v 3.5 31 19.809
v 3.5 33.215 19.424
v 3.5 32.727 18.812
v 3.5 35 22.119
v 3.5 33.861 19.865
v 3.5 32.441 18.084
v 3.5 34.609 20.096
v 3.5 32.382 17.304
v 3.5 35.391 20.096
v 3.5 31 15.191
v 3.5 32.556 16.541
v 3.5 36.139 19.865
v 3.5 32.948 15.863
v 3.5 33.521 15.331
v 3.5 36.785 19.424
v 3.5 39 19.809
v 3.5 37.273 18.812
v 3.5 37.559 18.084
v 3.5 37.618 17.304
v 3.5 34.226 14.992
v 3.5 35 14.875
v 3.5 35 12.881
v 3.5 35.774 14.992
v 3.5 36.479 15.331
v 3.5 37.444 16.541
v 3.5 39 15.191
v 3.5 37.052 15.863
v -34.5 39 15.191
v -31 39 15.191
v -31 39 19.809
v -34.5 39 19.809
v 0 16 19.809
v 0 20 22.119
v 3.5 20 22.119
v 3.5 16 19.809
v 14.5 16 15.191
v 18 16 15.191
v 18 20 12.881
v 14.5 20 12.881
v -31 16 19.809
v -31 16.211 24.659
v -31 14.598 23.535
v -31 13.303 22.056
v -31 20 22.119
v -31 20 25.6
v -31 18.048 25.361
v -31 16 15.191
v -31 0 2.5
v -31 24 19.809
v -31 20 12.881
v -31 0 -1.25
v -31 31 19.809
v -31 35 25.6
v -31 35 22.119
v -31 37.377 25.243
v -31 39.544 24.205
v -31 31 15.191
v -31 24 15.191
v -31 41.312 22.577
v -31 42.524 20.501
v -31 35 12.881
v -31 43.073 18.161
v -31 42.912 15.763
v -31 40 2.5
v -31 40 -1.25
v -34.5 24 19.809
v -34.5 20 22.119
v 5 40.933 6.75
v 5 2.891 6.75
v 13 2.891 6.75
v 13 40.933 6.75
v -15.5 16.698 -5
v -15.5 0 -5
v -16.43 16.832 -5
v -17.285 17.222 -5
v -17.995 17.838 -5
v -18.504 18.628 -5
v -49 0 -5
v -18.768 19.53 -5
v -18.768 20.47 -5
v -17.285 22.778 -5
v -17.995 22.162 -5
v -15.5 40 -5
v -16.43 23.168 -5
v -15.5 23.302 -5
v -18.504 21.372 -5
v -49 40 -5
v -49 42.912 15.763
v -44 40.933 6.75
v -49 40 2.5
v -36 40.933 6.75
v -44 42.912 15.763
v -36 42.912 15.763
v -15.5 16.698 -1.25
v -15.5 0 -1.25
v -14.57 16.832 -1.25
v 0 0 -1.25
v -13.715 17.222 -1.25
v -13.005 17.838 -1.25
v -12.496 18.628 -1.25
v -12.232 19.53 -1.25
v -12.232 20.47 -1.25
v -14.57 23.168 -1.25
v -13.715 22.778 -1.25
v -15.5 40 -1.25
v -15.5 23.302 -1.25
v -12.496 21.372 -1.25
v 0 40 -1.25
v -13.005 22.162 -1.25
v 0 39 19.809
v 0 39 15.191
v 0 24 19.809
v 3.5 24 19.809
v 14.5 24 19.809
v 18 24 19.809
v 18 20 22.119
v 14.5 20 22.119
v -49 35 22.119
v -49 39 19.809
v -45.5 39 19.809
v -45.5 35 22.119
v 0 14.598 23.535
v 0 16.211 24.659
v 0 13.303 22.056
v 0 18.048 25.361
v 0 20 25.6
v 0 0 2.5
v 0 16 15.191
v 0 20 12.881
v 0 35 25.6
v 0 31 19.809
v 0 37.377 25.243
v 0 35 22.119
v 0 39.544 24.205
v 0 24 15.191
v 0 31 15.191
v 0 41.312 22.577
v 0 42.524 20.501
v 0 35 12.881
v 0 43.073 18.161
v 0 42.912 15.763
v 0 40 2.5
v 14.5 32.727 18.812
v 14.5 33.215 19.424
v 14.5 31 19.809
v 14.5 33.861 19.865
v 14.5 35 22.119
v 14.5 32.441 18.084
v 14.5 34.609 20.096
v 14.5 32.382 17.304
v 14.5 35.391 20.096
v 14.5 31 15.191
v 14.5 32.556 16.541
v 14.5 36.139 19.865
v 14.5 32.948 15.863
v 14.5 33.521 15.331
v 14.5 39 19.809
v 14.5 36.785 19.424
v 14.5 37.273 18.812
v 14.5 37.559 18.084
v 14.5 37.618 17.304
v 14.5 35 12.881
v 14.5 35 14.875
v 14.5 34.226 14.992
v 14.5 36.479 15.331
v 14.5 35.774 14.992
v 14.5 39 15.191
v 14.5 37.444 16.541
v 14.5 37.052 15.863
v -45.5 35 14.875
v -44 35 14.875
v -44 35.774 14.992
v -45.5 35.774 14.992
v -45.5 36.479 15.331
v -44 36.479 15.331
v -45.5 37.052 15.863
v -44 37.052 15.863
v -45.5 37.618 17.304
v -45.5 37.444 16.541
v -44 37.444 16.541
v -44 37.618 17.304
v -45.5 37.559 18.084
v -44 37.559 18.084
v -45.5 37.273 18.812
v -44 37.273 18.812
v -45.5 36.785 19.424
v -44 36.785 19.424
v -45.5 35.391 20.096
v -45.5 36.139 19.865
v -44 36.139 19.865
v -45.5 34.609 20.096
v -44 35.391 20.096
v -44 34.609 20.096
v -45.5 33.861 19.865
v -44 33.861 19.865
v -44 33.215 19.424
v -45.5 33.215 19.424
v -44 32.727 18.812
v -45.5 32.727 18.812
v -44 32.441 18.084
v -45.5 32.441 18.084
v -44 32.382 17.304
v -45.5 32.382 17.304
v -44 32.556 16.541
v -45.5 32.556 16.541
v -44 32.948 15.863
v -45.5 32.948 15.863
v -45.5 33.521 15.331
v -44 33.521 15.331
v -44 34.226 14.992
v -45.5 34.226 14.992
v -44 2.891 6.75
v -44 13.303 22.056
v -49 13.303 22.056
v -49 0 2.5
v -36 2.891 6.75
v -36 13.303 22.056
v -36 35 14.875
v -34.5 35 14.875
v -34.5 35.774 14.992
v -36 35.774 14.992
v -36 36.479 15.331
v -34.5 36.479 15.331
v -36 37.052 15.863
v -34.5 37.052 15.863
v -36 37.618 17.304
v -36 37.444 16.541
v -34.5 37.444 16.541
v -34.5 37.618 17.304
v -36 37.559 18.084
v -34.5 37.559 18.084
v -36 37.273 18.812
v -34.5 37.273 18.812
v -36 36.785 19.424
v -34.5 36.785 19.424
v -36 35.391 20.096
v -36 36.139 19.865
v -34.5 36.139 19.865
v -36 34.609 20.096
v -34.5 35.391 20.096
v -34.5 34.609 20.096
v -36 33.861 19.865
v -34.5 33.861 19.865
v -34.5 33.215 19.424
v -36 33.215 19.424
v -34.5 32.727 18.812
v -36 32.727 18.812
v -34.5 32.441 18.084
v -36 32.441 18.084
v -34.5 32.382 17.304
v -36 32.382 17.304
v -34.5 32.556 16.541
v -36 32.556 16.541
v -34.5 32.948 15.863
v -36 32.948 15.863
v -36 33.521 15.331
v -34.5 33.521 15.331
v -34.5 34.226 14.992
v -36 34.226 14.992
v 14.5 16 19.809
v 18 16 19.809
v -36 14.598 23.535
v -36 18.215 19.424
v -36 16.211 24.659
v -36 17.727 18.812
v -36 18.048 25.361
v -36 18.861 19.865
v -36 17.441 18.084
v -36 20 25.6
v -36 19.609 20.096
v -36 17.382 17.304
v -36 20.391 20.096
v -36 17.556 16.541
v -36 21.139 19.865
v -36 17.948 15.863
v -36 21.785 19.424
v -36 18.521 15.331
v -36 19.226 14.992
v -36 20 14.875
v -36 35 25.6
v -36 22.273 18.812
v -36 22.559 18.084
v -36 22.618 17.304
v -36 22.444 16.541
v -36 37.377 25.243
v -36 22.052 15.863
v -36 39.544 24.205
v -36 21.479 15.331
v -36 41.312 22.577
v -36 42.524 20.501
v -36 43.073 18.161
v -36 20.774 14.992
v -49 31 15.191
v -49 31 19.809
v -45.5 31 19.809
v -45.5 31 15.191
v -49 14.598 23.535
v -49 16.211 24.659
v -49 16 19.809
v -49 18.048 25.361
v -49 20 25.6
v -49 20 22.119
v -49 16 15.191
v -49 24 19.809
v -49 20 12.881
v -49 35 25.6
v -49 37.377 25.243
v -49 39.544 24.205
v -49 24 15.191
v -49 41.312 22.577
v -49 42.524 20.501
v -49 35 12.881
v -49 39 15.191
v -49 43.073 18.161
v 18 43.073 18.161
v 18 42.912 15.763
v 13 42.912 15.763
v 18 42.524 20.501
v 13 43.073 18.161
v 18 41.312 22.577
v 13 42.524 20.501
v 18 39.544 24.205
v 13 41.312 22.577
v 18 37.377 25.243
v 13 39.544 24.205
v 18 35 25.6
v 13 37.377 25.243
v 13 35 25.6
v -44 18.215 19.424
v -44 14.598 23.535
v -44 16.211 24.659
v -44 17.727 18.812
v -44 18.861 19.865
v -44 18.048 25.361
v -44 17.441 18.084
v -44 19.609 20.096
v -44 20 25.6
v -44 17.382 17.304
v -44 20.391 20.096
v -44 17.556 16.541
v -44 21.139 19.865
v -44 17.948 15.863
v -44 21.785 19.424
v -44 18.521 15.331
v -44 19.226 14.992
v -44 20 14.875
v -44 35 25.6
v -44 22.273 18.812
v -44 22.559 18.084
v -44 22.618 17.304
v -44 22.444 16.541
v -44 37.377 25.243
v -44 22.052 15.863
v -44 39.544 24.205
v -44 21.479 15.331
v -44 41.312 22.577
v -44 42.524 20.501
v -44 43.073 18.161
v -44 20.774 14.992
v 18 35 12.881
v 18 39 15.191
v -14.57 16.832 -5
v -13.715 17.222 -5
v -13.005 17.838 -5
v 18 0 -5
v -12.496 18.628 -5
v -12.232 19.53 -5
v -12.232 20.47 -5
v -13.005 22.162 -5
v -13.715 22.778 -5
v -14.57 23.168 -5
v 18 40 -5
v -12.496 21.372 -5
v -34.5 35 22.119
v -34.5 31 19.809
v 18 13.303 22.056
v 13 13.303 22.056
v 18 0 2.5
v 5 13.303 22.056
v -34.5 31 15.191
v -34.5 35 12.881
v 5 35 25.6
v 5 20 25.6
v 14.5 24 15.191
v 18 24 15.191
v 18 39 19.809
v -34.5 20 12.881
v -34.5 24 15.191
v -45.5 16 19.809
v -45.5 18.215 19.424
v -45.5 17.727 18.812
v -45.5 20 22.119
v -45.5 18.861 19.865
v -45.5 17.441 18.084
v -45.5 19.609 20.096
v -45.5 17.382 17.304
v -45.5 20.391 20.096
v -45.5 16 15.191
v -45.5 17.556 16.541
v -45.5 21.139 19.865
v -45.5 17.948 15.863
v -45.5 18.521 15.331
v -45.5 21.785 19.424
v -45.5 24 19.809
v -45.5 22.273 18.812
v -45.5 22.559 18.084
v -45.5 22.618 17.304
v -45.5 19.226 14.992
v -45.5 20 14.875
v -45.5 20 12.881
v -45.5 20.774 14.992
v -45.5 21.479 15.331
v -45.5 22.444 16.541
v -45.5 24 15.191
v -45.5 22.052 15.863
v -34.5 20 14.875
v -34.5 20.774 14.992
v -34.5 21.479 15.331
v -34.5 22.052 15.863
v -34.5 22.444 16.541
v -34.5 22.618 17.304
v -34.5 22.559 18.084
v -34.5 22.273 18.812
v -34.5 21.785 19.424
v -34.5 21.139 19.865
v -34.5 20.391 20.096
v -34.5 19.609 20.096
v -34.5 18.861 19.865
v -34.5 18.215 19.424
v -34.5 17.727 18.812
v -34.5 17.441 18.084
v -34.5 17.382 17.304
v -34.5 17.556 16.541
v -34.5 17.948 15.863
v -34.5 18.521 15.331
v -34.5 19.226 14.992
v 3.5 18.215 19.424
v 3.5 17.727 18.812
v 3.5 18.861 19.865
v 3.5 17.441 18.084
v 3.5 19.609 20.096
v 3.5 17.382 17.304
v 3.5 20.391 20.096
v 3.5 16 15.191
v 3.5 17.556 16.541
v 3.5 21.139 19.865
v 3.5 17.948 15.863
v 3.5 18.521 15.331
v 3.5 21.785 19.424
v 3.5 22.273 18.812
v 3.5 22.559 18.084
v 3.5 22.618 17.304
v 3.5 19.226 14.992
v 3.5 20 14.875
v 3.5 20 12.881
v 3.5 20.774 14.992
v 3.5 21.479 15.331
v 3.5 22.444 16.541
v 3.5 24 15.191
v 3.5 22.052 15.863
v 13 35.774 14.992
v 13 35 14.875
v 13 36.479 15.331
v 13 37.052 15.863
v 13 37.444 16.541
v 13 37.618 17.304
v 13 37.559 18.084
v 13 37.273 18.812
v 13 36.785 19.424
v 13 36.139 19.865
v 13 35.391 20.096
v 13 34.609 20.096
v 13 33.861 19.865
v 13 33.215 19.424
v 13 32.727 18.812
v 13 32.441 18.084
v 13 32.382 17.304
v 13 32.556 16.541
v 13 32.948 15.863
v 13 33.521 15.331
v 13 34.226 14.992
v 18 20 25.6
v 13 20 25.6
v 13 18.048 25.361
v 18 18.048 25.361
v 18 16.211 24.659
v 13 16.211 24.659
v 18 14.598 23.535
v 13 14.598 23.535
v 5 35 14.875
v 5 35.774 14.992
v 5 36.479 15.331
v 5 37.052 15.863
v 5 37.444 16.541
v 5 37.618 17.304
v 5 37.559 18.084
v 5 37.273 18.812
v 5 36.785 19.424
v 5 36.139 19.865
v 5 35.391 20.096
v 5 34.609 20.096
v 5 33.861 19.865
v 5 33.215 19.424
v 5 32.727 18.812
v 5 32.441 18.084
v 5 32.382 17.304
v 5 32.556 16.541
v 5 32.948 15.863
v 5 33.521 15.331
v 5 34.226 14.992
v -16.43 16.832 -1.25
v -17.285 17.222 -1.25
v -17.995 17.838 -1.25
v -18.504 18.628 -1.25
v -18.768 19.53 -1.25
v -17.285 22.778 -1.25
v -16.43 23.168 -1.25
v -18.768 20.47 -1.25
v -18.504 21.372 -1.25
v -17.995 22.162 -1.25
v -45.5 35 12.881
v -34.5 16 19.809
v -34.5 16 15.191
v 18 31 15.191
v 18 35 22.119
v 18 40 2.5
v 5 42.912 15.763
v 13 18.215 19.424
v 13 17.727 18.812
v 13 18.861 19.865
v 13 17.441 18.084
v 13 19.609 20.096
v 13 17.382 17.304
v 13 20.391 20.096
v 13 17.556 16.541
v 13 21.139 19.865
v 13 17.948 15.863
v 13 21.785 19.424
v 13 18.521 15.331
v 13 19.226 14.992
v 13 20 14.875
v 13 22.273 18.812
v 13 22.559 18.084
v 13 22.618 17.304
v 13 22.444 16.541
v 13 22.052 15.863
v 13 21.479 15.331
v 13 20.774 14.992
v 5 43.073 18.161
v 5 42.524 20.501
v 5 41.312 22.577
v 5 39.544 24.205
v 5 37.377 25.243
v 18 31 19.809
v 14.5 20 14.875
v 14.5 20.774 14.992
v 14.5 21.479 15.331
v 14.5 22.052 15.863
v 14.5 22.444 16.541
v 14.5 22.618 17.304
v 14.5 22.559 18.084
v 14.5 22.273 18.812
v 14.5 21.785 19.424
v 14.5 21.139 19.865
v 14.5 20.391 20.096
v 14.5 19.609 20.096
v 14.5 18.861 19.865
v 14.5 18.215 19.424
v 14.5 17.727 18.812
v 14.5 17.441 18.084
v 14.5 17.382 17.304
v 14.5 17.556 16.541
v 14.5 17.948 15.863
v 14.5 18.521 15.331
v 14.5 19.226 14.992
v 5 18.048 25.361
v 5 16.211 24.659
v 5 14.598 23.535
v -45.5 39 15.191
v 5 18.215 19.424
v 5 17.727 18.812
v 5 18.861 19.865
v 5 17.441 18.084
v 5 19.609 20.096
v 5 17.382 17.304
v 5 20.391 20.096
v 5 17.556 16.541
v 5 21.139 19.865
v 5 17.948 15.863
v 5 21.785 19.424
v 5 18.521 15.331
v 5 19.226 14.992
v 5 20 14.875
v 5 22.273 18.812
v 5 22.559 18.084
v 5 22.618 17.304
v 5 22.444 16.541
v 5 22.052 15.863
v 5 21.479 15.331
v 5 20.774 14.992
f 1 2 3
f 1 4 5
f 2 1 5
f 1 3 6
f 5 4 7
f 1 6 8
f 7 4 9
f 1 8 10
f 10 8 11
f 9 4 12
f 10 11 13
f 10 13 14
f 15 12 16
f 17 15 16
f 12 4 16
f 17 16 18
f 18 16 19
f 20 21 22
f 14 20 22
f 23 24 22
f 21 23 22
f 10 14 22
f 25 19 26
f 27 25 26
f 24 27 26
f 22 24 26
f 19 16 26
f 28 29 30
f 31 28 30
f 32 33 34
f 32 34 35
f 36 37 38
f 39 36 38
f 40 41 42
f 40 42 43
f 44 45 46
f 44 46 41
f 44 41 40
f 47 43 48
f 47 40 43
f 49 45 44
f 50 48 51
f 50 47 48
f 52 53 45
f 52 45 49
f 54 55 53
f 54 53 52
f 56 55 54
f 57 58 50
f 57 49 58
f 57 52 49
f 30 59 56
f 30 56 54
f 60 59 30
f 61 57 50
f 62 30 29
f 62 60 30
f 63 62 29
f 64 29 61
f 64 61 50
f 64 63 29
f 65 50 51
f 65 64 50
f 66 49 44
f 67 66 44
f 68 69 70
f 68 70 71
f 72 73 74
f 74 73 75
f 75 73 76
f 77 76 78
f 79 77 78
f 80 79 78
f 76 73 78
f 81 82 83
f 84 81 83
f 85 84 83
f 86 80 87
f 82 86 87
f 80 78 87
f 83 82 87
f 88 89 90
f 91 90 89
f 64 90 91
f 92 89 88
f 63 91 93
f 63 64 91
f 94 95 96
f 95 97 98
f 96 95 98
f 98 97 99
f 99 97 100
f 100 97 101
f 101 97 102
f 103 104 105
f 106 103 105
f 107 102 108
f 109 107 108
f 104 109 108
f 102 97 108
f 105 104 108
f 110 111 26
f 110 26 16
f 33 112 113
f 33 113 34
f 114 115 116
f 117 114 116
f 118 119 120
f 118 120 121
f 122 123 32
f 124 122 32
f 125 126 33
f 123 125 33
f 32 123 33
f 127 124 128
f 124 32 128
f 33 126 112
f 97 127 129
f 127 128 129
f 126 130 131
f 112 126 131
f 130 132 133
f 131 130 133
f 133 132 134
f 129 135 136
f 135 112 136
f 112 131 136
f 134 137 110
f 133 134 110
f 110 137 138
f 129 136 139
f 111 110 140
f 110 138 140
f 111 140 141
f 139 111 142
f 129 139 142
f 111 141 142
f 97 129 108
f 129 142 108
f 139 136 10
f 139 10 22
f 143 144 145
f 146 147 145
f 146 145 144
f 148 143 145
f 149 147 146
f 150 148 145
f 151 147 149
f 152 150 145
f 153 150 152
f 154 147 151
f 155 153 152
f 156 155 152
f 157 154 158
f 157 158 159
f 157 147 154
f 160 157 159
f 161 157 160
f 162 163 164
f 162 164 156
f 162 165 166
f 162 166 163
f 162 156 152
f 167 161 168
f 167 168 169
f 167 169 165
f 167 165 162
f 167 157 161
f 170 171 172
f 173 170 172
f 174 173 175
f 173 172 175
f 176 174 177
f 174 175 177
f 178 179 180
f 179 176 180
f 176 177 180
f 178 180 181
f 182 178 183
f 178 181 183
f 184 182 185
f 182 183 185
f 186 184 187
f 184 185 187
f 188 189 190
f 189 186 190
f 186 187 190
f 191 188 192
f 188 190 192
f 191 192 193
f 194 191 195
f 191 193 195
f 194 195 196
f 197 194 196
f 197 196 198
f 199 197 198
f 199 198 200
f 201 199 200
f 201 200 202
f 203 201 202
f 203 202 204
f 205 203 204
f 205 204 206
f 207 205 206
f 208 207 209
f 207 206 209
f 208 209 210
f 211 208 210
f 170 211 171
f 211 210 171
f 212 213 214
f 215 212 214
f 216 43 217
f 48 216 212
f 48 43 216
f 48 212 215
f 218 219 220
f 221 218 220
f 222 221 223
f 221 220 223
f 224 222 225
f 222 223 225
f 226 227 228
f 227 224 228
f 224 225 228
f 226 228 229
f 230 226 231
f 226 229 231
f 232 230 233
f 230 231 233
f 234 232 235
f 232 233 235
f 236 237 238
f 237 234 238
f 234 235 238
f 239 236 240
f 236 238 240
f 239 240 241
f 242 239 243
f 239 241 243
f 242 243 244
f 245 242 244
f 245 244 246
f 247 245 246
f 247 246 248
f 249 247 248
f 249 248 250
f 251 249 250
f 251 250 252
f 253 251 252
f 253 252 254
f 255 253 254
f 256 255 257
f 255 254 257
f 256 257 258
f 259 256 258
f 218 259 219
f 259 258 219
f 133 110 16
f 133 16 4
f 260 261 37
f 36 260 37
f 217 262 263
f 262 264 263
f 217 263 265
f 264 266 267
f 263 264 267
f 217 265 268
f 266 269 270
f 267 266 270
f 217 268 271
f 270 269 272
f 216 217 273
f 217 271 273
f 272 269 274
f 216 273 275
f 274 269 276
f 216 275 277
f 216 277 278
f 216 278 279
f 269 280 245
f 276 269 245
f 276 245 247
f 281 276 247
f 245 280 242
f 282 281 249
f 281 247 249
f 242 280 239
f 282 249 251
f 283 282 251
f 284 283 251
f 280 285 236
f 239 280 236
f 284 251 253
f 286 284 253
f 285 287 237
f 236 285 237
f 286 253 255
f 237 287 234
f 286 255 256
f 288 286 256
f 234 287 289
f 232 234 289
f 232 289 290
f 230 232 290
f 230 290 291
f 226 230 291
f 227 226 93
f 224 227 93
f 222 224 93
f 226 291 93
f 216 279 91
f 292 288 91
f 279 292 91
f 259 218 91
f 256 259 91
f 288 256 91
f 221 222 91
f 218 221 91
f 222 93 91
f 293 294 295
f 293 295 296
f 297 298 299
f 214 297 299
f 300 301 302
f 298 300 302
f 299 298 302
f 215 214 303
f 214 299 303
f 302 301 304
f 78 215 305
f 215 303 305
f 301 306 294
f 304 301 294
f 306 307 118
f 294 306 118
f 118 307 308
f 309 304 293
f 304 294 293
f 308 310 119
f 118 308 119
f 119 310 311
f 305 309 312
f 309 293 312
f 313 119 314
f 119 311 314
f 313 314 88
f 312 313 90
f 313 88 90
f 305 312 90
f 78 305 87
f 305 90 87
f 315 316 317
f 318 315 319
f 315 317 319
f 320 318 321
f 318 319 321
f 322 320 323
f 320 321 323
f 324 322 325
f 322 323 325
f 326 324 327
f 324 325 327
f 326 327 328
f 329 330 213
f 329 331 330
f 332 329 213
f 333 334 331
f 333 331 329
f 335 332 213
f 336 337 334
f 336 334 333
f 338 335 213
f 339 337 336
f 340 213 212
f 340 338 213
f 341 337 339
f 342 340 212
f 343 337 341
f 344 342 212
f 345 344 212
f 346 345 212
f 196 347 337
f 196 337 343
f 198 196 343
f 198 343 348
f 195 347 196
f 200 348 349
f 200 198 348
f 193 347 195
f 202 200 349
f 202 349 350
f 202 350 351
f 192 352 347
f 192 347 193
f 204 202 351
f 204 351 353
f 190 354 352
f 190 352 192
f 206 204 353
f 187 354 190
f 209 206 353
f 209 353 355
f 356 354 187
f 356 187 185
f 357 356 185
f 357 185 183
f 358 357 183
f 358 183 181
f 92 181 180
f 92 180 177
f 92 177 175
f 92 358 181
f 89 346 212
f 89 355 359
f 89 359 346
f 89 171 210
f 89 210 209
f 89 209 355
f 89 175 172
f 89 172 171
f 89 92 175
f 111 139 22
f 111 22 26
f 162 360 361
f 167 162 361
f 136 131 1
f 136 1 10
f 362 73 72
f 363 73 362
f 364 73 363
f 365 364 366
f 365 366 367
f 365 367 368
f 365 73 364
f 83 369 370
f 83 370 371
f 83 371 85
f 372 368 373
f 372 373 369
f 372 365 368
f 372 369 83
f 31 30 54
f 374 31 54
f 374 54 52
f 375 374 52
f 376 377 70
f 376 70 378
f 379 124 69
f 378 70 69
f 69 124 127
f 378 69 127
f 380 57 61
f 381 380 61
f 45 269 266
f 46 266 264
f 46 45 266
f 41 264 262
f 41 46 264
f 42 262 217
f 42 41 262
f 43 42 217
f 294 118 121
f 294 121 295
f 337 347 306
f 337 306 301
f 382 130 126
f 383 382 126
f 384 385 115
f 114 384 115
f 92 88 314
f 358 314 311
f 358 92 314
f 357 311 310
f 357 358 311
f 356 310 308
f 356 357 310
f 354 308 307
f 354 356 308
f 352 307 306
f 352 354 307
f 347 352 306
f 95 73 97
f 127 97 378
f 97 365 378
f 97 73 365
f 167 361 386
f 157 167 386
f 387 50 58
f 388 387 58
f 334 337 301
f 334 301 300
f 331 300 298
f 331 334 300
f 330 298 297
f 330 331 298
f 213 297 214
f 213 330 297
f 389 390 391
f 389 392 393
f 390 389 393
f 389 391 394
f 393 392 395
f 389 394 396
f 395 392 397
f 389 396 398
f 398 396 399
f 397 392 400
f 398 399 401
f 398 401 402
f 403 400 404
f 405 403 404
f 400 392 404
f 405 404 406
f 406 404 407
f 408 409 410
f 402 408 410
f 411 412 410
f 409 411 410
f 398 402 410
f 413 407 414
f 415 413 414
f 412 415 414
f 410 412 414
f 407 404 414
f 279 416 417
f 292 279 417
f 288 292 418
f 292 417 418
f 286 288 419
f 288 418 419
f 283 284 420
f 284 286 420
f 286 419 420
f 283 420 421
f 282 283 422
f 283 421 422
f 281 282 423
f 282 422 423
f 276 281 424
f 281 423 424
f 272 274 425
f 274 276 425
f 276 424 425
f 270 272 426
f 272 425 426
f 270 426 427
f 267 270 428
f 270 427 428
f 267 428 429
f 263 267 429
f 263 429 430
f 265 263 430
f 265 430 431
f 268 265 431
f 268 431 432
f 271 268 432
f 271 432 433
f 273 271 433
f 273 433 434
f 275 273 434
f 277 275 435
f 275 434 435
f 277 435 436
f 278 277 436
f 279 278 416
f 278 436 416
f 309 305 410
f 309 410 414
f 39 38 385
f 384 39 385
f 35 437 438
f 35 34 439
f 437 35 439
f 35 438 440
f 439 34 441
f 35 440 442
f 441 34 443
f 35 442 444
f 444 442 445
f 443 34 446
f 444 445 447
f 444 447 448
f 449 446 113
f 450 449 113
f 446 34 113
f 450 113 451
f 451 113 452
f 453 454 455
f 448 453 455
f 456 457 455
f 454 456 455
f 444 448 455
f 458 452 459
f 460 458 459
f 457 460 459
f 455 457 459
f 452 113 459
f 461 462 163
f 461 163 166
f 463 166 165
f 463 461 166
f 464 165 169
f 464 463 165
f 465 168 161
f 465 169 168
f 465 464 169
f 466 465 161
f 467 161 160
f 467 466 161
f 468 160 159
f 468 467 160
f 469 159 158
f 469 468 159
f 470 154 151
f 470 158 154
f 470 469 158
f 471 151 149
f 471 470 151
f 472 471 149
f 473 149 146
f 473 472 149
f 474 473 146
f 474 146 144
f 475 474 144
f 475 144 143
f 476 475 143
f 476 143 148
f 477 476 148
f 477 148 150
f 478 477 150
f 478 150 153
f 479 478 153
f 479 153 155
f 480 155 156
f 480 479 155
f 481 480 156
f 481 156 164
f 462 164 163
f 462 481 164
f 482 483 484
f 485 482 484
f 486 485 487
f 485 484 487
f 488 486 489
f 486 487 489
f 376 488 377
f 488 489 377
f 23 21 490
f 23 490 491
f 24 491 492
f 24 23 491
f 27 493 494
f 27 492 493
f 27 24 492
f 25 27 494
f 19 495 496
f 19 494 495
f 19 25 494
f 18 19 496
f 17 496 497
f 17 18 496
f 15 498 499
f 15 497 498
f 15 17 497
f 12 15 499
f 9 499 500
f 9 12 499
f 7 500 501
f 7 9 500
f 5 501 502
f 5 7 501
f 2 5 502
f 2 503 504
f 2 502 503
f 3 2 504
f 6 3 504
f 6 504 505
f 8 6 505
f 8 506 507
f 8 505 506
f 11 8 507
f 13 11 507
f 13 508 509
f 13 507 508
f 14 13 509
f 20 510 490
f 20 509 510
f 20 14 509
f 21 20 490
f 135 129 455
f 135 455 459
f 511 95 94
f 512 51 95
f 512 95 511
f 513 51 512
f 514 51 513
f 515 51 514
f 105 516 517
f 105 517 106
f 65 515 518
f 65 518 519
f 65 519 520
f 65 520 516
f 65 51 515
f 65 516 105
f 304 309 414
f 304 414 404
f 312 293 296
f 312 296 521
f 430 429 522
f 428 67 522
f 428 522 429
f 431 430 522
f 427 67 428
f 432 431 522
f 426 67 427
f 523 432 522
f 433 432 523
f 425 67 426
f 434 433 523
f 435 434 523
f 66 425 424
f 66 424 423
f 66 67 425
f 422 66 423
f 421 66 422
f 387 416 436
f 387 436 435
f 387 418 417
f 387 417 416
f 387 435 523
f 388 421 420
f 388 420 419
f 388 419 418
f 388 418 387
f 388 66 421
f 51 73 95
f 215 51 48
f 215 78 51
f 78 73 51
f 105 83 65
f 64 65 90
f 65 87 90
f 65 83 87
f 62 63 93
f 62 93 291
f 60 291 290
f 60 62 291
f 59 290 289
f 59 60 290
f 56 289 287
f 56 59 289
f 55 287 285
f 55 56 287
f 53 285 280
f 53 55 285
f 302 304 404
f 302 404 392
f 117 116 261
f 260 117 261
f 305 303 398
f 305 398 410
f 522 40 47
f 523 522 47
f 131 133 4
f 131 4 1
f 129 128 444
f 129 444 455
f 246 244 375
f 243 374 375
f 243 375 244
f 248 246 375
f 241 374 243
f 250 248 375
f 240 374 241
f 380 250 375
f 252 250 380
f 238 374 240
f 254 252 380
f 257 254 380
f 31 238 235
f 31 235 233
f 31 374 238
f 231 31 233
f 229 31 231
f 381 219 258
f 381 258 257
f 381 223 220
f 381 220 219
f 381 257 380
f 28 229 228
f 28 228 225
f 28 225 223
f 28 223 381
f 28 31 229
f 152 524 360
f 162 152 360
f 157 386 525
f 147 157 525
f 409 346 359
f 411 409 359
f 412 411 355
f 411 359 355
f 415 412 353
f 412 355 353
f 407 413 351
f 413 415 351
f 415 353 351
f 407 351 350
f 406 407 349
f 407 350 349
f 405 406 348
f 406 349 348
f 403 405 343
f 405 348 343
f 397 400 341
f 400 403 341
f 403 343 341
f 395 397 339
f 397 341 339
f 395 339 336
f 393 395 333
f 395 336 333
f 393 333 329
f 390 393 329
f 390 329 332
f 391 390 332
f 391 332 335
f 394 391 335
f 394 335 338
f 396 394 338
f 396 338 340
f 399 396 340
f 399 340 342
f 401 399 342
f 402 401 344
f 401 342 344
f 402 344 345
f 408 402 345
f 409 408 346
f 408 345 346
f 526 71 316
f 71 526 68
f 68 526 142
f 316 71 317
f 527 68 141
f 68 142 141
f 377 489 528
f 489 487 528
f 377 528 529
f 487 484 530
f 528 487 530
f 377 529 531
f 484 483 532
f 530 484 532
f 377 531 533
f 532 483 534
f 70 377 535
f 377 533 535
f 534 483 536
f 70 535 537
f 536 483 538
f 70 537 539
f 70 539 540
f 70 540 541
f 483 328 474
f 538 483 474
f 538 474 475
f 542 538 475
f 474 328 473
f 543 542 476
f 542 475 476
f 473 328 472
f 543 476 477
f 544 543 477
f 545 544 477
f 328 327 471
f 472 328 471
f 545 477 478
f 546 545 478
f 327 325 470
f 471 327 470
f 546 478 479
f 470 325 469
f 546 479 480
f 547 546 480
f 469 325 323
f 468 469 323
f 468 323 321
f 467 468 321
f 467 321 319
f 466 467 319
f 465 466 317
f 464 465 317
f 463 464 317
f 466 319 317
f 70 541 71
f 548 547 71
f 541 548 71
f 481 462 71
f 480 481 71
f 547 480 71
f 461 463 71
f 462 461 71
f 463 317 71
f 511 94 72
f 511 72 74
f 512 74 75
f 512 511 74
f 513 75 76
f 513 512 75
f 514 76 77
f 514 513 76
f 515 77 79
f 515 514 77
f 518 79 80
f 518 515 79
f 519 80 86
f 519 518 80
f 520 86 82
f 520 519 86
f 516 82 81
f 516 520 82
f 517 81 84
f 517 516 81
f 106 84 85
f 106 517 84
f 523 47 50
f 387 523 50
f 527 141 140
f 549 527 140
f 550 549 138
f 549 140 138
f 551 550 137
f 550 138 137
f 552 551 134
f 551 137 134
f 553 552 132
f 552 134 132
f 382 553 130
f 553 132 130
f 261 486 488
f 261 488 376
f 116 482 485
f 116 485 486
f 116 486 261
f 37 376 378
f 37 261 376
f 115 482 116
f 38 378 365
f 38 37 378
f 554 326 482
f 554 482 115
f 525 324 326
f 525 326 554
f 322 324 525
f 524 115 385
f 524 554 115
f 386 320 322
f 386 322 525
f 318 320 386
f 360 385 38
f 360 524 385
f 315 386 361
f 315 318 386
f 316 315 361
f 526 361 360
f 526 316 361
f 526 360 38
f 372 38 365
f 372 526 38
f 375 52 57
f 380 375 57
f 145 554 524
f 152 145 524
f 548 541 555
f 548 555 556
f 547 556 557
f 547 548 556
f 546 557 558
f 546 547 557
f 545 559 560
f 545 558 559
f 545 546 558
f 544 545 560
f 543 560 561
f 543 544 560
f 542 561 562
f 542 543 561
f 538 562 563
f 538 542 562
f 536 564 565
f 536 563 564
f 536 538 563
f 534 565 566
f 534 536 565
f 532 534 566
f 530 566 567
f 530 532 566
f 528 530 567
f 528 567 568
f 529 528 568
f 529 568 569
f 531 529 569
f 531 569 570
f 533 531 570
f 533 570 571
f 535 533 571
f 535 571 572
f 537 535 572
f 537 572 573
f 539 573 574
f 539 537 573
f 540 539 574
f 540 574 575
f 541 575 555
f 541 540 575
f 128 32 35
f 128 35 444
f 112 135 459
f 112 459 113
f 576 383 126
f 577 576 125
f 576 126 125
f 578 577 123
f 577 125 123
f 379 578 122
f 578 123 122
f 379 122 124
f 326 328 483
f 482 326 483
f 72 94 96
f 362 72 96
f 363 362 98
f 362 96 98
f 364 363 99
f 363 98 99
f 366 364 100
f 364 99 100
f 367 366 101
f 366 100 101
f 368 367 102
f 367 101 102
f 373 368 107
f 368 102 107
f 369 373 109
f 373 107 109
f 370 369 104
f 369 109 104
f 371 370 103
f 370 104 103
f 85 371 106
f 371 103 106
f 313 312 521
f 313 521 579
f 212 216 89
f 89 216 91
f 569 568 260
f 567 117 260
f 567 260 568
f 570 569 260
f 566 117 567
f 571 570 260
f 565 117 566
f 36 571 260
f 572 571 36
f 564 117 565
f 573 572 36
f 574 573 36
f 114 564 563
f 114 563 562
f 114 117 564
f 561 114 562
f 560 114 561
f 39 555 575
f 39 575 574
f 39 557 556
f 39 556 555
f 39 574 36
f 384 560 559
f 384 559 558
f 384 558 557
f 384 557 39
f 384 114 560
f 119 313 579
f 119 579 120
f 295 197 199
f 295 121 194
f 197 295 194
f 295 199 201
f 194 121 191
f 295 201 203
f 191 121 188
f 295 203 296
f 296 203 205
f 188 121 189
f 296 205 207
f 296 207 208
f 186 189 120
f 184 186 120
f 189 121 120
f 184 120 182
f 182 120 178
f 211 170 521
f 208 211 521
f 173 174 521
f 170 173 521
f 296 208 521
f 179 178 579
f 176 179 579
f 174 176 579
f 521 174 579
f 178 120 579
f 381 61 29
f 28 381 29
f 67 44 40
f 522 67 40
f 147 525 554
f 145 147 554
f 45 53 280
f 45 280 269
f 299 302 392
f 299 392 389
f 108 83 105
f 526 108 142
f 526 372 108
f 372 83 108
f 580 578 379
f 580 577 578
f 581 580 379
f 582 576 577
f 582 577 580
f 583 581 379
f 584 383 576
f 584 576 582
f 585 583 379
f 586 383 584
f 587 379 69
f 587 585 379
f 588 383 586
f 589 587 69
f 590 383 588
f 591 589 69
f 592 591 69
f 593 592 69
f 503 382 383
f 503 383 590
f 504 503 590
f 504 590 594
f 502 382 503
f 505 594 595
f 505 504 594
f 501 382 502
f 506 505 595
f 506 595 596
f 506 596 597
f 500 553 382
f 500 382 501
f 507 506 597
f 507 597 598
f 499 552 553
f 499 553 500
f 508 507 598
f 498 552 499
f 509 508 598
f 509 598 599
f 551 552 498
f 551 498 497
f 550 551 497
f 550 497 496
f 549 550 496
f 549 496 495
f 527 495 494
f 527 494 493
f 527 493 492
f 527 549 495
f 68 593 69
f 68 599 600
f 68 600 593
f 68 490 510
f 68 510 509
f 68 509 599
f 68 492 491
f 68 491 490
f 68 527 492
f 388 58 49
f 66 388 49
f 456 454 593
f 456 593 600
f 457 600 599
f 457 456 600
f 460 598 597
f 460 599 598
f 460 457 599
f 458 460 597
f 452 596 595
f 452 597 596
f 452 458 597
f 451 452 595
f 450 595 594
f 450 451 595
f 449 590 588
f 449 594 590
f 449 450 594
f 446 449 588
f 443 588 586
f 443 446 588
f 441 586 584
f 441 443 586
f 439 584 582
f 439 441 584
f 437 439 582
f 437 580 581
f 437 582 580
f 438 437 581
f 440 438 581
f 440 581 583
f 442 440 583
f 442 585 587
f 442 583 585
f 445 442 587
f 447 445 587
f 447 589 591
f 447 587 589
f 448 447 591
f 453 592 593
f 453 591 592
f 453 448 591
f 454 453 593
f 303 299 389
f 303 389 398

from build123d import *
from build123d.topology import SkipClean

# Parameters (mm, degrees)
SKETCH1_R               = 2.625
BOSS_EXTRUDE1_DEPTH     = 18
SKETCH2_W               = 3.75
SKETCH2_H               = 40
BOSS_EXTRUDE2_DEPTH     = 15.5
CUT_EXTRUDE1_DEPTH      = 3.5
CUT_EXTRUDE2_DEPTH      = 4
CUT_EXTRUDE2_DEPTH_BACK = 4
SKETCH4_W               = 26.185074211
SKETCH4_H               = 43.492971865
CUT_EXTRUDE3_DEPTH      = 3.75


with BuildPart() as part:
    # Sketch1 → Boss-Extrude1 (new body)
    with BuildSketch(Plane(origin=(0, 0, 0), x_dir=(0, 0, -1), z_dir=(1, 0, 0))):
        with BuildLine():
            Line((0, 0), (5, 0))
            Line((5, 0), (5, 40))
            Line((5, 40), (0, 40))
            Line((0, 40), (-2.5, 40))
            Line((-2.5, 40), (-15.763202528, 42.911607583))
            ThreePointArc((-15.763202528, 42.911607583), (-22.576511621, 41.311816677), (-25.6, 35))
            Line((-25.6, 35), (-25.6, 20))
            ThreePointArc((-25.6, 20), (-24.659331675, 16.211336651), (-22.055809883, 13.302642588))
            Line((-22.055809883, 13.302642588), (-2.5, 0))
            Line((-2.5, 0), (0, 0))
        make_face()
        with Locations((-17.5, 35)):
            Circle(SKETCH1_R, mode=Mode.SUBTRACT)
        with Locations((-17.5, 20)):
            Circle(SKETCH1_R, mode=Mode.SUBTRACT)
    extrude(amount=BOSS_EXTRUDE1_DEPTH)

    # Sketch2 → Boss-Extrude2 (add)
    with BuildSketch(Plane.ZY):
        with Locations((-3.125, 20)):
            Rectangle(SKETCH2_W, SKETCH2_H)
    extrude(amount=BOSS_EXTRUDE2_DEPTH)

    # Sketch3 → Cut-Extrude1 (cut)
    with BuildSketch(Plane(origin=(18, 0, 0), x_dir=(0, 0, -1), z_dir=(1, 0, 0))):
        Polygon((-12.881197846, 35), (-15.190598923, 39), (-19.809401077, 39), (-22.118802154, 35), (-19.809401077, 31), (-15.190598923, 31), align=None)
        Polygon((-12.881197846, 20), (-15.190598923, 24), (-19.809401077, 24), (-22.118802154, 20), (-19.809401077, 16), (-15.190598923, 16), align=None)
    cut_extrude1 = extrude(amount=-CUT_EXTRUDE1_DEPTH, mode=Mode.SUBTRACT)

    # Mirror1: Cut-Extrude1 across plane
    add(cut_extrude1.mirror(Plane(origin=(9, 0, 0), x_dir=(0, 0, 1), z_dir=(1, 0, 0))), mode=Mode.SUBTRACT)

    # Sketch4 → Cut-Extrude2 (cut, two sides: drawn at the far end of the back side and taken through both)
    with BuildSketch(Plane(origin=(9, 0, 0), x_dir=(0, 0, -1), z_dir=(1, 0, 0)).offset(-CUT_EXTRUDE2_DEPTH_BACK)):
        with Locations((-19.842537105, 21.746485933)):
            Rectangle(SKETCH4_W, SKETCH4_H)
    extrude(amount=CUT_EXTRUDE2_DEPTH + CUT_EXTRUDE2_DEPTH_BACK, mode=Mode.SUBTRACT)

    # Sketch5 → Cut-Extrude3 (cut)
    with BuildSketch(Plane.XY.offset(-1.25)):
        with BuildLine():
            Line((-15.5, 23.302), (-15.5, 16.698))
            ThreePointArc((-15.5, 16.698), (-12.198, 20), (-15.5, 23.302))
        make_face()
    extrude(amount=-CUT_EXTRUDE3_DEPTH, mode=Mode.SUBTRACT)

    # Mirror2: part across plane


with BuildPart() as part_1:
    with SkipClean():  # the faces are left unmerged after this step: merging them gives an invalid solid
        add(part.part)
        add(part.part.mirror(Plane(origin=(-15.5, 0, 0), x_dir=(0, 0, 1), z_dir=(1, 0, 0))))


solid = part_1.part
